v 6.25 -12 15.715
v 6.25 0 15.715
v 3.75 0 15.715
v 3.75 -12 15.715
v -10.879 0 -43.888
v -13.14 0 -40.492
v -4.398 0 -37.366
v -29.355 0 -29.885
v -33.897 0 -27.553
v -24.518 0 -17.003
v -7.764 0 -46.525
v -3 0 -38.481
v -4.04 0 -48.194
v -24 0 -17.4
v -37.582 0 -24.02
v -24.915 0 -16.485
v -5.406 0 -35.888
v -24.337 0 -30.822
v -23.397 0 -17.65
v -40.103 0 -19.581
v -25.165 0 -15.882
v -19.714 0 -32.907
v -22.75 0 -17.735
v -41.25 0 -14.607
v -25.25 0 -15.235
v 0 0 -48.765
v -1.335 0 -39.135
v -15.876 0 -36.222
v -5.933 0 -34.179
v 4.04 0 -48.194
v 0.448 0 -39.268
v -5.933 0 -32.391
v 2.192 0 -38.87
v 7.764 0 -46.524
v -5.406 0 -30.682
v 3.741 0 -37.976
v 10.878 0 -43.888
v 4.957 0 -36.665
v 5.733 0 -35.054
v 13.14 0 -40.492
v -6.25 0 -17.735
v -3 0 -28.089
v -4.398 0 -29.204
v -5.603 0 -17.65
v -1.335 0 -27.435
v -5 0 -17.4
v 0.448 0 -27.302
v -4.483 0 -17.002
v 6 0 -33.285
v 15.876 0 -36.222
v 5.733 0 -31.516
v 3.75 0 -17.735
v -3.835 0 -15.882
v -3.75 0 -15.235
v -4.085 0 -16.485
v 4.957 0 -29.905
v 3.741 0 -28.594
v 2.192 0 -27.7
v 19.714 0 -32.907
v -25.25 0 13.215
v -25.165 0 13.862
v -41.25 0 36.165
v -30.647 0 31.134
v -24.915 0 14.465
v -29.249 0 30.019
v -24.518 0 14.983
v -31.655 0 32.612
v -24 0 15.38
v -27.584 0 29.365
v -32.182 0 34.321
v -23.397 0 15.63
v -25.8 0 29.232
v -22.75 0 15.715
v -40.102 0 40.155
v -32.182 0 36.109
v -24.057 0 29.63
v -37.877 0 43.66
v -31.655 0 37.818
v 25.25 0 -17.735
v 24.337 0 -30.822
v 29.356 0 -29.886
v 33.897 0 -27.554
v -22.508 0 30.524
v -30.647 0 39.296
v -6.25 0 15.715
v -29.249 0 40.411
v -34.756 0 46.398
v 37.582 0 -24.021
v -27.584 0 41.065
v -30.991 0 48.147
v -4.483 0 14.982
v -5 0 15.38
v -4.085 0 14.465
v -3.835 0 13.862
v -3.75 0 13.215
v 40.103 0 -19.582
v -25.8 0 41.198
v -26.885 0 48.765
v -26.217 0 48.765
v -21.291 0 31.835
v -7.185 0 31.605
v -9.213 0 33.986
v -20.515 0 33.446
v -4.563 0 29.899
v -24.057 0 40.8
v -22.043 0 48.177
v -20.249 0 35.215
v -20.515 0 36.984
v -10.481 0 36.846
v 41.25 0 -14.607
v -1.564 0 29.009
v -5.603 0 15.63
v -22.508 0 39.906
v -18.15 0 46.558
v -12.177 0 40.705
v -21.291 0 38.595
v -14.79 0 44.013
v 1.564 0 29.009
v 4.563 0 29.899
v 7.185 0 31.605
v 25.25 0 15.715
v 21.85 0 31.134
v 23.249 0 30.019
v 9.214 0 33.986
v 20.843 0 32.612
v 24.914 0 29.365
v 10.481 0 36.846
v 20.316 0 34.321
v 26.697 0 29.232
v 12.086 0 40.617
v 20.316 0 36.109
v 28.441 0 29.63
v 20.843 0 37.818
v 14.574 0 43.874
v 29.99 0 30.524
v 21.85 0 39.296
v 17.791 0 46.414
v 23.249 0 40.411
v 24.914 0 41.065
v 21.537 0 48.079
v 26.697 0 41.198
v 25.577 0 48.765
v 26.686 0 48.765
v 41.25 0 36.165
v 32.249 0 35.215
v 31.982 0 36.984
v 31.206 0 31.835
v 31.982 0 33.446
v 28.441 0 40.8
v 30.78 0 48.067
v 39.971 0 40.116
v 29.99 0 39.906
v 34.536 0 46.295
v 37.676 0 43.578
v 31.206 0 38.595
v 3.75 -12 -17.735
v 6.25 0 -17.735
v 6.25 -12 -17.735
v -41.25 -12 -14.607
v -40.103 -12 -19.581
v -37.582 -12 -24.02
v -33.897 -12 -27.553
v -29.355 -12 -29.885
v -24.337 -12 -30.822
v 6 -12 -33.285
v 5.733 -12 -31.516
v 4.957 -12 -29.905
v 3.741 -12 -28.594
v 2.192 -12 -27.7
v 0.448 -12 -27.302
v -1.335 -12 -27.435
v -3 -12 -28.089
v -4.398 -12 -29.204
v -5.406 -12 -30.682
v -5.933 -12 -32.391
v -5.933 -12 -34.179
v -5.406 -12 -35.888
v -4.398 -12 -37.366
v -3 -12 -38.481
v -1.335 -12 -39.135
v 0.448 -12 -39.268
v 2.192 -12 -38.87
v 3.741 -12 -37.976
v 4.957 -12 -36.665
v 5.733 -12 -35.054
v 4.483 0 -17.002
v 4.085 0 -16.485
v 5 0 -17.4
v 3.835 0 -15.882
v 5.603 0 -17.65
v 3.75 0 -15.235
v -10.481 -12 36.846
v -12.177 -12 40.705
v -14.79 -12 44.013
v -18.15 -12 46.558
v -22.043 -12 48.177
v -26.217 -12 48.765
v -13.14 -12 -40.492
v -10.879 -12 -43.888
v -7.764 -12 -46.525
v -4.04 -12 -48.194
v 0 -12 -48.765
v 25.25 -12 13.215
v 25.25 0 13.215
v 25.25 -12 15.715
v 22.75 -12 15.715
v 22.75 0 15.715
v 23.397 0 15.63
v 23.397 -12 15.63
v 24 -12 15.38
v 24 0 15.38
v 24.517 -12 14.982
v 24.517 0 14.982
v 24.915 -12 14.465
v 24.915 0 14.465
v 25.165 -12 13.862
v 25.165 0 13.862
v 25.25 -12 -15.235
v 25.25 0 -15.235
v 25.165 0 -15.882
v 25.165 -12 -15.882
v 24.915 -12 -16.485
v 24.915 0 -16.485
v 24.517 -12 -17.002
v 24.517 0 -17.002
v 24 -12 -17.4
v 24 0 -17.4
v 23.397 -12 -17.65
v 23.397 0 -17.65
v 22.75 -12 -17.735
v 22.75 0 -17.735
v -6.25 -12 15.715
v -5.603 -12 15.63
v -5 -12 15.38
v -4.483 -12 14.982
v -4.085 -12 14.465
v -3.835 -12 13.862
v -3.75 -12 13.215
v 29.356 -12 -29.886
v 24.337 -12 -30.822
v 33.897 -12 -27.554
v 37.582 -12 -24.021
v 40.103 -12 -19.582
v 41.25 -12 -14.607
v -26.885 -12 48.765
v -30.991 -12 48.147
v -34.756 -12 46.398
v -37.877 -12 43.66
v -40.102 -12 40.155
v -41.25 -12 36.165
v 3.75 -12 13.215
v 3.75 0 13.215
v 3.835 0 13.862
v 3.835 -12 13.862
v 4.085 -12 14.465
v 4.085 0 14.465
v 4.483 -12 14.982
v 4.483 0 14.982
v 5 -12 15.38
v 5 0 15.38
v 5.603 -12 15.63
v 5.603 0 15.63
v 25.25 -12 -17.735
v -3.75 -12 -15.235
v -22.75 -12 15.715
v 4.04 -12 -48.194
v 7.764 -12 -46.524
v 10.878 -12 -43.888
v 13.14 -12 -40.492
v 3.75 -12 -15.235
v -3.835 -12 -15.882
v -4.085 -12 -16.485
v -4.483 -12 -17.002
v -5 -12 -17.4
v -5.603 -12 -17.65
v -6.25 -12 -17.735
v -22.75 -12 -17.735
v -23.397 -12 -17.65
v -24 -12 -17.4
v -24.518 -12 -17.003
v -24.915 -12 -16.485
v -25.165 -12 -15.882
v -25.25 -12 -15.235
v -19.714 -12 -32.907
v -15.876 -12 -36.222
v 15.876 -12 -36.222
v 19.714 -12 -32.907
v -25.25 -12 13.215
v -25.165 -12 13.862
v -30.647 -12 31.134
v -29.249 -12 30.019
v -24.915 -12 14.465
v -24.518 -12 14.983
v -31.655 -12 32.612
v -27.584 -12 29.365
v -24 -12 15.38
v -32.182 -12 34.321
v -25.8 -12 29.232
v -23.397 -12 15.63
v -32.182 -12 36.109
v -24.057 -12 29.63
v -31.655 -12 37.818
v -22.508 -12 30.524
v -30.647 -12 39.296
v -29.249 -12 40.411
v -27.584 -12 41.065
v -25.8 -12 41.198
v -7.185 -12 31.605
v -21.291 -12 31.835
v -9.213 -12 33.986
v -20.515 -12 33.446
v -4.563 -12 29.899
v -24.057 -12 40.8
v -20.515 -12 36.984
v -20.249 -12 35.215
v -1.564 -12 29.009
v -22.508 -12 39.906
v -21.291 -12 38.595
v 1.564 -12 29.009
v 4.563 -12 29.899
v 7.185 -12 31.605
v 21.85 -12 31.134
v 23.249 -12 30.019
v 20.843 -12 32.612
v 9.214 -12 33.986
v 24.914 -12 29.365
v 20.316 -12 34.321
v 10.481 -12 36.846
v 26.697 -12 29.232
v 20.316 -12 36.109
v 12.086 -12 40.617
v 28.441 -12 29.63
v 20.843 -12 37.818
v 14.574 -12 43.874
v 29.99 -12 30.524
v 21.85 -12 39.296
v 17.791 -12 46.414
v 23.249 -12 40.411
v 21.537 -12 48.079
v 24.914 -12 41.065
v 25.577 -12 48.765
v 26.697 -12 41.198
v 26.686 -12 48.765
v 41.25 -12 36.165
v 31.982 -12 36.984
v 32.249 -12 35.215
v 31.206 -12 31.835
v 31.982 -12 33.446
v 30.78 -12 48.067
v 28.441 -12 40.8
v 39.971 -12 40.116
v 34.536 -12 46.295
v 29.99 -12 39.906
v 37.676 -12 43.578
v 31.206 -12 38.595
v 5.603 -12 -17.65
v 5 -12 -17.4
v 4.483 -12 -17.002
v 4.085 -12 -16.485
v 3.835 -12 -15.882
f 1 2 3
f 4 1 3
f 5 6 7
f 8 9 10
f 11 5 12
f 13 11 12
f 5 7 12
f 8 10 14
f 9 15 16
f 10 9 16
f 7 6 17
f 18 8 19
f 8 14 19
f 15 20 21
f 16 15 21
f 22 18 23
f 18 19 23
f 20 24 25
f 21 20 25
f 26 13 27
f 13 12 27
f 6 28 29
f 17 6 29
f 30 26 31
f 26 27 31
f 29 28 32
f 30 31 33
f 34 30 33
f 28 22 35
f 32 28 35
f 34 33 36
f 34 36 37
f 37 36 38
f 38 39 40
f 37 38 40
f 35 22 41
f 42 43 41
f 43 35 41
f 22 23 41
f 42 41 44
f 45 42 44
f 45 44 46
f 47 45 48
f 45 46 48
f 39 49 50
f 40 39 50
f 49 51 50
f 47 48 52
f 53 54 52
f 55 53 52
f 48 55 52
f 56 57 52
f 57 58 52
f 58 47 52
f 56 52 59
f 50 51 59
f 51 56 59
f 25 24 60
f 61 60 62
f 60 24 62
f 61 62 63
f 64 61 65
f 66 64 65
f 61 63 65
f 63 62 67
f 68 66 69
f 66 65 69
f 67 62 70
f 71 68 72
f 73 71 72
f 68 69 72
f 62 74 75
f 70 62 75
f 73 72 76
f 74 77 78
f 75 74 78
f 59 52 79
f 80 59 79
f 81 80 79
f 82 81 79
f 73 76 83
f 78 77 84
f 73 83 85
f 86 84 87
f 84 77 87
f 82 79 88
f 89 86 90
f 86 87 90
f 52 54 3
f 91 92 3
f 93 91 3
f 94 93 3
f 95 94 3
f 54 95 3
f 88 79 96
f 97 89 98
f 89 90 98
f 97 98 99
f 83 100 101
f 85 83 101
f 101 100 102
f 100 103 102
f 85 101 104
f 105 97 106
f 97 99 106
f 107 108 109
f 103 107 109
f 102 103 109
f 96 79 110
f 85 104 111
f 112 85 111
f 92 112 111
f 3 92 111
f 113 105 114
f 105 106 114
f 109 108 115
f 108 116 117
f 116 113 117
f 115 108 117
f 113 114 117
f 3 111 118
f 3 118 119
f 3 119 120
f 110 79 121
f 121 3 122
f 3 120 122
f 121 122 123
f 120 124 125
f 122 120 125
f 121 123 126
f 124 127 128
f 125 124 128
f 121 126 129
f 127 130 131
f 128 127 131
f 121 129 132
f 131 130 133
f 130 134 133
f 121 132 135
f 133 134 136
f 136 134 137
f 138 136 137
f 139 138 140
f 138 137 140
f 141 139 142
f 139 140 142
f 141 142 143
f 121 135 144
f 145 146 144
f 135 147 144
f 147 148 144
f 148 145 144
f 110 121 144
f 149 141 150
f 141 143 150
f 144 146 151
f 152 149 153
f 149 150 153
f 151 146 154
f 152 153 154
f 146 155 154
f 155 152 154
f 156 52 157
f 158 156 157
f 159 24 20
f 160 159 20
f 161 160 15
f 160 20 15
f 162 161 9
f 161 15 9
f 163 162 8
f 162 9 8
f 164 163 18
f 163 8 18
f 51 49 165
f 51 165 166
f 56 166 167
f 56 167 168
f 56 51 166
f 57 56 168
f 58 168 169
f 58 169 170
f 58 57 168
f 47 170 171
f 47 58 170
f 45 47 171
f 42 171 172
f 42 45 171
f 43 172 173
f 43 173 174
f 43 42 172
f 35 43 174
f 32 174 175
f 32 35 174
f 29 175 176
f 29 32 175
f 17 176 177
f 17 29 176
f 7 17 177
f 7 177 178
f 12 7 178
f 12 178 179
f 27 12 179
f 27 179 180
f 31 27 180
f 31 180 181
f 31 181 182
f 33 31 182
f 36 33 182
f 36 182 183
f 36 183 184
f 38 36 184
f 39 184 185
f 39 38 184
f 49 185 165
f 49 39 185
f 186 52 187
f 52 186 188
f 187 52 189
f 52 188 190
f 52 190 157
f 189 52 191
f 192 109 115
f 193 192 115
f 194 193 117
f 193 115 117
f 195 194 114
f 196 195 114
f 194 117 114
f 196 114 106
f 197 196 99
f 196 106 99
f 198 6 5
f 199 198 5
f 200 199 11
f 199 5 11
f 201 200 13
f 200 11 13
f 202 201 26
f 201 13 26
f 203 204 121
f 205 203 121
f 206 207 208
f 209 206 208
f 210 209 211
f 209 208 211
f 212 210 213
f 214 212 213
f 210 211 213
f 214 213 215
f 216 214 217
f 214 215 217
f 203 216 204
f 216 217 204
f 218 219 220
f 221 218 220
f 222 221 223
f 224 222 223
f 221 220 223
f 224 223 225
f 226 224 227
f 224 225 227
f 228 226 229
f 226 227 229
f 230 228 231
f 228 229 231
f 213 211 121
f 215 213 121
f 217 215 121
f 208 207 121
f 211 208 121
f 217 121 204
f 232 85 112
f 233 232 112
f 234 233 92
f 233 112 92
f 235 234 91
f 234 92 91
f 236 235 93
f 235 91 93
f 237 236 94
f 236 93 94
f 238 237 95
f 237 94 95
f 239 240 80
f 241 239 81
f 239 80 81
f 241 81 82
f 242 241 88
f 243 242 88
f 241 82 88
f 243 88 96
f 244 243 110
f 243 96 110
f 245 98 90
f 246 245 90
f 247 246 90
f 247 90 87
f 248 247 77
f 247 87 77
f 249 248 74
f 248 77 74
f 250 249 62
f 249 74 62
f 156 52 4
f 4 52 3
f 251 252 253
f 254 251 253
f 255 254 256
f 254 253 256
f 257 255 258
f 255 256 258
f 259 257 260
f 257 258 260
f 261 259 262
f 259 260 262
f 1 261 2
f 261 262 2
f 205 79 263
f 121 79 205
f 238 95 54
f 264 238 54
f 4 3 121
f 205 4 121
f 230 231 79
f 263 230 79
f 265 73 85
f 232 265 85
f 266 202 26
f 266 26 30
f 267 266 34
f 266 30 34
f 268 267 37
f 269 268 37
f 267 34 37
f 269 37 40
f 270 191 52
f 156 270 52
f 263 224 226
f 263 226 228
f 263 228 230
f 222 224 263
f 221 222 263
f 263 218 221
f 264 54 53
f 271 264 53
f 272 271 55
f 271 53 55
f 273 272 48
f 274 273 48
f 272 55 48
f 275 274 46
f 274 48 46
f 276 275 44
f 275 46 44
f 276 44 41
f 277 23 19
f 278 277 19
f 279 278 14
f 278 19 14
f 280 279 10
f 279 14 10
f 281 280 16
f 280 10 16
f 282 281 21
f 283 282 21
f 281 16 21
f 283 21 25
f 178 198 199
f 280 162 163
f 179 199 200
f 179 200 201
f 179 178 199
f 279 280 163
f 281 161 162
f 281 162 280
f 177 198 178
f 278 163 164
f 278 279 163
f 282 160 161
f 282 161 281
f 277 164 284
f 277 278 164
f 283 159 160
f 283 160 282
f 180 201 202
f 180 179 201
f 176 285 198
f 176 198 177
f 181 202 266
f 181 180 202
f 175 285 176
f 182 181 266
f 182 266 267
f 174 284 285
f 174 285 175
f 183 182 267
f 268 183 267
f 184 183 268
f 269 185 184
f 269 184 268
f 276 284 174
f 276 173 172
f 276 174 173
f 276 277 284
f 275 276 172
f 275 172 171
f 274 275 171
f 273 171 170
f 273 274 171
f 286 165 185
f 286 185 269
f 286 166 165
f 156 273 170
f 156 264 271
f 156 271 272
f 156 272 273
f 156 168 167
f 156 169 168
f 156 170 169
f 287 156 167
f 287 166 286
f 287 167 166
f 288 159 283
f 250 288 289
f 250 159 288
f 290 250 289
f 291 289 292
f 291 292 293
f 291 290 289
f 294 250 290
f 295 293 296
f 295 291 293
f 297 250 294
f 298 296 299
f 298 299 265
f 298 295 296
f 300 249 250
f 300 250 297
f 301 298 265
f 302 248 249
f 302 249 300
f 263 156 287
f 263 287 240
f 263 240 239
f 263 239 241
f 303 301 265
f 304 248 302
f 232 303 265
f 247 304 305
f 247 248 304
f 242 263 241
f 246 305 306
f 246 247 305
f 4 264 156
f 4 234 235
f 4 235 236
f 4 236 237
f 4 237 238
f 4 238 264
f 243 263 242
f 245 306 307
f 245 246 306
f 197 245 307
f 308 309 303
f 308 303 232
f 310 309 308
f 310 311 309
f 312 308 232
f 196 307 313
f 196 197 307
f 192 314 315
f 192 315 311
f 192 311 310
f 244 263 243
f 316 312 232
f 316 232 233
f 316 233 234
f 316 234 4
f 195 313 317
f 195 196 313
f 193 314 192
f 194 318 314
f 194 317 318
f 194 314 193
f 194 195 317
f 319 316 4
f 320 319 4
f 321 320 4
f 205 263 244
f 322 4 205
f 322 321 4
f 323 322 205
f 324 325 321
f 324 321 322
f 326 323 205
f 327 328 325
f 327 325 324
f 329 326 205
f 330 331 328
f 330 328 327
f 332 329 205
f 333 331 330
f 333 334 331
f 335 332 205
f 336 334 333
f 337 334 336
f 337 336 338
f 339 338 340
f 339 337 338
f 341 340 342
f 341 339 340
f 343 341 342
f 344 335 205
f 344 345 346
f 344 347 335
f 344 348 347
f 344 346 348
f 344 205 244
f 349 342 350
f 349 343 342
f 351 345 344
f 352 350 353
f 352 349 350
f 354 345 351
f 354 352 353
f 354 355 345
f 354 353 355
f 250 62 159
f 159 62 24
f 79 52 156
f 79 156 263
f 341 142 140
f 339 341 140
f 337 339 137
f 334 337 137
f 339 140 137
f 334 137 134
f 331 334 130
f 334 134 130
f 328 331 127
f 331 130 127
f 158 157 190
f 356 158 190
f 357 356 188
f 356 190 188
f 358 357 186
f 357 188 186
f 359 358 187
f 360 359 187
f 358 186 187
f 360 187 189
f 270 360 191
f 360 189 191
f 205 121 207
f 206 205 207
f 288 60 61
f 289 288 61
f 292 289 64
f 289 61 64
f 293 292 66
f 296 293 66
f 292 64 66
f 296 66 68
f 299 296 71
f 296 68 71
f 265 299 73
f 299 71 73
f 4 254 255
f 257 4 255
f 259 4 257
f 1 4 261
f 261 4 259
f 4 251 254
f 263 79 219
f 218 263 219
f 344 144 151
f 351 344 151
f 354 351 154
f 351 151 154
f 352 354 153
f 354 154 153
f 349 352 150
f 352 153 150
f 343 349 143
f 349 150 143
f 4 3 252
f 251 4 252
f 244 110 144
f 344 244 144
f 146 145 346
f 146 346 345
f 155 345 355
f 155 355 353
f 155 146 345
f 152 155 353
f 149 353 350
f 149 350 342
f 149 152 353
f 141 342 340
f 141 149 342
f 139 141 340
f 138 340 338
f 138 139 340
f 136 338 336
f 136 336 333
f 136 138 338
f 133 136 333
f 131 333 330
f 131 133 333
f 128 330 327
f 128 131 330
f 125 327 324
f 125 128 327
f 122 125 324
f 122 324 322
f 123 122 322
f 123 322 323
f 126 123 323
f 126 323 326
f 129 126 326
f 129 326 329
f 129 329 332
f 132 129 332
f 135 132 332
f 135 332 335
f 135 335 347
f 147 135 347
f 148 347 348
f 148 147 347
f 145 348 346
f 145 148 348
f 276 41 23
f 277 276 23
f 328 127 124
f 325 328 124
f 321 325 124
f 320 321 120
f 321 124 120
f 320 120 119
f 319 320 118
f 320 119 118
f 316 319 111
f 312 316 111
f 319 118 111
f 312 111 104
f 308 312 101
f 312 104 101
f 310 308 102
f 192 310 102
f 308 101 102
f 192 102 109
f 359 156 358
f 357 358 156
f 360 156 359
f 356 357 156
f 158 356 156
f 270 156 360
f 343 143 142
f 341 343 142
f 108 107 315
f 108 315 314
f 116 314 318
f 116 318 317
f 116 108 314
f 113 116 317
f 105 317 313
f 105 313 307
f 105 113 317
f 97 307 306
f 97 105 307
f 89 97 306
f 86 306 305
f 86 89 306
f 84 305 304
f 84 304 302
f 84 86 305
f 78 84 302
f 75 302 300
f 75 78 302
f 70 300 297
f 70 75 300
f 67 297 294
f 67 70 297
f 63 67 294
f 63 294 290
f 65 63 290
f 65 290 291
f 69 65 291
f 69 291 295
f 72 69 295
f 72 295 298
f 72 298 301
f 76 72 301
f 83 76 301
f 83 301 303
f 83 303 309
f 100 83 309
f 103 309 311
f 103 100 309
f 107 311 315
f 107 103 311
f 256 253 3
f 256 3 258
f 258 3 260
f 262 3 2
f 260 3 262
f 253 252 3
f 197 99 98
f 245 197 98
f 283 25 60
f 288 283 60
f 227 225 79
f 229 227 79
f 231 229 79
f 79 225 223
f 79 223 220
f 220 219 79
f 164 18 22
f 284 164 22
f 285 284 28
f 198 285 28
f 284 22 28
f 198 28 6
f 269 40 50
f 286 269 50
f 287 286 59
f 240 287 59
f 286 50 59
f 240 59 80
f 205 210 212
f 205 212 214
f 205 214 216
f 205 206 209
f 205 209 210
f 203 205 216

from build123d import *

# Parameters (mm, degrees)
F4_R     = 6
F4_W     = 21.5
F4_H     = 33.45
F6_DEPTH = 12


with BuildPart() as f6:
    # F4 (on face) → F6 (new body)
    with BuildSketch(Plane.XZ):
        with BuildLine():
            ThreePointArc((-41.25, -14.607), (-35.8674022278, -25.9207231501), (-24.337, -30.822))
            ThreePointArc((-24.337, -30.822), (-17.6753424514, -34.4258801724), (-13.1401661783, -40.492))
            ThreePointArc((-13.1401661783, -40.492), (-7.7638565745, -46.5245050412), (-9.43185e-05, -48.765))
            ThreePointArc((-9.43185e-05, -48.765), (7.7636899207, -46.5244912019), (13.14, -40.4919531523))
            ThreePointArc((13.14, -40.4919531523), (17.6755802004, -34.4261199153), (24.3369212747, -30.8216288686))
            ThreePointArc((24.3369212747, -30.8216288686), (35.8680052264, -25.921153722), (41.25, -14.606796205))
            Line((41.25, -14.606796205), (41.25, 36.165))
            ThreePointArc((41.25, 36.165), (36.1986202104, 45.0433137098), (26.686, 48.765))
            Line((26.686, 48.765), (25.5774514153, 48.765))
            ThreePointArc((25.5774514153, 48.765), (16.1031746077, 45.24501144), (10.481, 36.846))
            ThreePointArc((10.481, 36.846), (0.0002400088, 28.896512173), (-10.4806832969, 36.8457846785))
            ThreePointArc((-10.4806832969, 36.8457846785), (-16.3890913636, 45.3926785372), (-26.2169155617, 48.765))
            Line((-26.2169155617, 48.765), (-26.6445539892, 48.765))
            Line((-26.6445539892, 48.765), (-26.6858417388, 48.765))
            Line((-26.6858417388, 48.765), (-26.8851875879, 48.765))
            ThreePointArc((-26.8851875879, 48.765), (-36.4145684312, 45.1407024127), (-41.25, 36.165))
            Line((-41.25, 36.165), (-41.25, -14.607))
        make_face()
        Polygon((-25.25, 15.715), (-22.75, 15.715), (-6.25, 15.715), (-3.75, 15.715), (-3.75, 13.215), (-3.75, -15.235), (-3.75, -17.735), (-6.25, -17.735), (-22.75, -17.735), (-25.25, -17.735), (-25.25, -15.235), (-25.25, 13.215), align=None, mode=Mode.SUBTRACT)
        with Locations((0, -33.285)):
            Circle(F4_R, mode=Mode.SUBTRACT)
        with Locations((14.5, -1.01)):
            Rectangle(F4_W, F4_H, mode=Mode.SUBTRACT)
        with Locations((-26.2487990011, 35.215)):
            Circle(F4_R, mode=Mode.SUBTRACT)
        with Locations((26.2487990011, 35.215)):
            Circle(F4_R, mode=Mode.SUBTRACT)
        with BuildLine():
            Line((-3.75, -17.735), (-3.75, -15.235))
            ThreePointArc((-3.75, -15.235), (-4.4825626253, -17.0024373747), (-6.25, -17.735))
            Line((-6.25, -17.735), (-3.75, -17.735))
        make_face()
        with BuildLine():
            ThreePointArc((-25.25, 13.215), (-24.517766953, 14.982766953), (-22.75, 15.715))
            Line((-22.75, 15.715), (-25.25, 15.715))
            Line((-25.25, 15.715), (-25.25, 13.215))
        make_face()
        with BuildLine():
            ThreePointArc((-22.75, -17.735), (-24.517766953, -17.002766953), (-25.25, -15.235))
            Line((-25.25, -15.235), (-25.25, -17.735))
            Line((-25.25, -17.735), (-22.75, -17.735))
        make_face()
        with BuildLine():
            Line((-3.75, 15.715), (-6.25, 15.715))
            ThreePointArc((-6.25, 15.715), (-4.4825626253, 14.9824373747), (-3.75, 13.215))
            Line((-3.75, 13.215), (-3.75, 15.715))
        make_face()
    extrude(amount=F6_DEPTH)


with BuildPart() as f6b:
    # F5 (on face) → F6, piece 2 (new body)
    with BuildSketch(Plane.XZ):
        with BuildLine():
            ThreePointArc((6.25, -17.735), (4.4825626253, -17.0024373747), (3.75, -15.235))
            Line((3.75, -15.235), (3.75, -17.735))
            Line((3.75, -17.735), (6.25, -17.735))
        make_face()
    extrude(amount=F6_DEPTH)


with BuildPart() as f6c:
    # F5 (on face) → F6, piece 3 (new body)
    with BuildSketch(Plane.XZ):
        with BuildLine():
            ThreePointArc((3.75, 13.215), (4.4825626253, 14.9824373747), (6.25, 15.715))
            Line((6.25, 15.715), (3.75, 15.715))
            Line((3.75, 15.715), (3.75, 13.215))
        make_face()
    extrude(amount=F6_DEPTH)


with BuildPart() as f6d:
    # F5 (on face) → F6, piece 4 (new body)
    with BuildSketch(Plane.XZ):
        with BuildLine():
            Line((25.25, -17.735), (25.25, -15.235))
            ThreePointArc((25.25, -15.235), (24.5174373747, -17.0024373747), (22.75, -17.735))
            Line((22.75, -17.735), (25.25, -17.735))
        make_face()
    extrude(amount=F6_DEPTH)


with BuildPart() as f6e:
    # F5 (on face) → F6, piece 5 (new body)
    with BuildSketch(Plane.XZ):
        with BuildLine():
            Line((25.25, 15.715), (22.75, 15.715))
            ThreePointArc((22.75, 15.715), (24.5174373747, 14.9824373747), (25.25, 13.215))
            Line((25.25, 13.215), (25.25, 15.715))
        make_face()
    extrude(amount=F6_DEPTH)


solid = Compound([f6.part, f6b.part, f6c.part, f6d.part, f6e.part])
